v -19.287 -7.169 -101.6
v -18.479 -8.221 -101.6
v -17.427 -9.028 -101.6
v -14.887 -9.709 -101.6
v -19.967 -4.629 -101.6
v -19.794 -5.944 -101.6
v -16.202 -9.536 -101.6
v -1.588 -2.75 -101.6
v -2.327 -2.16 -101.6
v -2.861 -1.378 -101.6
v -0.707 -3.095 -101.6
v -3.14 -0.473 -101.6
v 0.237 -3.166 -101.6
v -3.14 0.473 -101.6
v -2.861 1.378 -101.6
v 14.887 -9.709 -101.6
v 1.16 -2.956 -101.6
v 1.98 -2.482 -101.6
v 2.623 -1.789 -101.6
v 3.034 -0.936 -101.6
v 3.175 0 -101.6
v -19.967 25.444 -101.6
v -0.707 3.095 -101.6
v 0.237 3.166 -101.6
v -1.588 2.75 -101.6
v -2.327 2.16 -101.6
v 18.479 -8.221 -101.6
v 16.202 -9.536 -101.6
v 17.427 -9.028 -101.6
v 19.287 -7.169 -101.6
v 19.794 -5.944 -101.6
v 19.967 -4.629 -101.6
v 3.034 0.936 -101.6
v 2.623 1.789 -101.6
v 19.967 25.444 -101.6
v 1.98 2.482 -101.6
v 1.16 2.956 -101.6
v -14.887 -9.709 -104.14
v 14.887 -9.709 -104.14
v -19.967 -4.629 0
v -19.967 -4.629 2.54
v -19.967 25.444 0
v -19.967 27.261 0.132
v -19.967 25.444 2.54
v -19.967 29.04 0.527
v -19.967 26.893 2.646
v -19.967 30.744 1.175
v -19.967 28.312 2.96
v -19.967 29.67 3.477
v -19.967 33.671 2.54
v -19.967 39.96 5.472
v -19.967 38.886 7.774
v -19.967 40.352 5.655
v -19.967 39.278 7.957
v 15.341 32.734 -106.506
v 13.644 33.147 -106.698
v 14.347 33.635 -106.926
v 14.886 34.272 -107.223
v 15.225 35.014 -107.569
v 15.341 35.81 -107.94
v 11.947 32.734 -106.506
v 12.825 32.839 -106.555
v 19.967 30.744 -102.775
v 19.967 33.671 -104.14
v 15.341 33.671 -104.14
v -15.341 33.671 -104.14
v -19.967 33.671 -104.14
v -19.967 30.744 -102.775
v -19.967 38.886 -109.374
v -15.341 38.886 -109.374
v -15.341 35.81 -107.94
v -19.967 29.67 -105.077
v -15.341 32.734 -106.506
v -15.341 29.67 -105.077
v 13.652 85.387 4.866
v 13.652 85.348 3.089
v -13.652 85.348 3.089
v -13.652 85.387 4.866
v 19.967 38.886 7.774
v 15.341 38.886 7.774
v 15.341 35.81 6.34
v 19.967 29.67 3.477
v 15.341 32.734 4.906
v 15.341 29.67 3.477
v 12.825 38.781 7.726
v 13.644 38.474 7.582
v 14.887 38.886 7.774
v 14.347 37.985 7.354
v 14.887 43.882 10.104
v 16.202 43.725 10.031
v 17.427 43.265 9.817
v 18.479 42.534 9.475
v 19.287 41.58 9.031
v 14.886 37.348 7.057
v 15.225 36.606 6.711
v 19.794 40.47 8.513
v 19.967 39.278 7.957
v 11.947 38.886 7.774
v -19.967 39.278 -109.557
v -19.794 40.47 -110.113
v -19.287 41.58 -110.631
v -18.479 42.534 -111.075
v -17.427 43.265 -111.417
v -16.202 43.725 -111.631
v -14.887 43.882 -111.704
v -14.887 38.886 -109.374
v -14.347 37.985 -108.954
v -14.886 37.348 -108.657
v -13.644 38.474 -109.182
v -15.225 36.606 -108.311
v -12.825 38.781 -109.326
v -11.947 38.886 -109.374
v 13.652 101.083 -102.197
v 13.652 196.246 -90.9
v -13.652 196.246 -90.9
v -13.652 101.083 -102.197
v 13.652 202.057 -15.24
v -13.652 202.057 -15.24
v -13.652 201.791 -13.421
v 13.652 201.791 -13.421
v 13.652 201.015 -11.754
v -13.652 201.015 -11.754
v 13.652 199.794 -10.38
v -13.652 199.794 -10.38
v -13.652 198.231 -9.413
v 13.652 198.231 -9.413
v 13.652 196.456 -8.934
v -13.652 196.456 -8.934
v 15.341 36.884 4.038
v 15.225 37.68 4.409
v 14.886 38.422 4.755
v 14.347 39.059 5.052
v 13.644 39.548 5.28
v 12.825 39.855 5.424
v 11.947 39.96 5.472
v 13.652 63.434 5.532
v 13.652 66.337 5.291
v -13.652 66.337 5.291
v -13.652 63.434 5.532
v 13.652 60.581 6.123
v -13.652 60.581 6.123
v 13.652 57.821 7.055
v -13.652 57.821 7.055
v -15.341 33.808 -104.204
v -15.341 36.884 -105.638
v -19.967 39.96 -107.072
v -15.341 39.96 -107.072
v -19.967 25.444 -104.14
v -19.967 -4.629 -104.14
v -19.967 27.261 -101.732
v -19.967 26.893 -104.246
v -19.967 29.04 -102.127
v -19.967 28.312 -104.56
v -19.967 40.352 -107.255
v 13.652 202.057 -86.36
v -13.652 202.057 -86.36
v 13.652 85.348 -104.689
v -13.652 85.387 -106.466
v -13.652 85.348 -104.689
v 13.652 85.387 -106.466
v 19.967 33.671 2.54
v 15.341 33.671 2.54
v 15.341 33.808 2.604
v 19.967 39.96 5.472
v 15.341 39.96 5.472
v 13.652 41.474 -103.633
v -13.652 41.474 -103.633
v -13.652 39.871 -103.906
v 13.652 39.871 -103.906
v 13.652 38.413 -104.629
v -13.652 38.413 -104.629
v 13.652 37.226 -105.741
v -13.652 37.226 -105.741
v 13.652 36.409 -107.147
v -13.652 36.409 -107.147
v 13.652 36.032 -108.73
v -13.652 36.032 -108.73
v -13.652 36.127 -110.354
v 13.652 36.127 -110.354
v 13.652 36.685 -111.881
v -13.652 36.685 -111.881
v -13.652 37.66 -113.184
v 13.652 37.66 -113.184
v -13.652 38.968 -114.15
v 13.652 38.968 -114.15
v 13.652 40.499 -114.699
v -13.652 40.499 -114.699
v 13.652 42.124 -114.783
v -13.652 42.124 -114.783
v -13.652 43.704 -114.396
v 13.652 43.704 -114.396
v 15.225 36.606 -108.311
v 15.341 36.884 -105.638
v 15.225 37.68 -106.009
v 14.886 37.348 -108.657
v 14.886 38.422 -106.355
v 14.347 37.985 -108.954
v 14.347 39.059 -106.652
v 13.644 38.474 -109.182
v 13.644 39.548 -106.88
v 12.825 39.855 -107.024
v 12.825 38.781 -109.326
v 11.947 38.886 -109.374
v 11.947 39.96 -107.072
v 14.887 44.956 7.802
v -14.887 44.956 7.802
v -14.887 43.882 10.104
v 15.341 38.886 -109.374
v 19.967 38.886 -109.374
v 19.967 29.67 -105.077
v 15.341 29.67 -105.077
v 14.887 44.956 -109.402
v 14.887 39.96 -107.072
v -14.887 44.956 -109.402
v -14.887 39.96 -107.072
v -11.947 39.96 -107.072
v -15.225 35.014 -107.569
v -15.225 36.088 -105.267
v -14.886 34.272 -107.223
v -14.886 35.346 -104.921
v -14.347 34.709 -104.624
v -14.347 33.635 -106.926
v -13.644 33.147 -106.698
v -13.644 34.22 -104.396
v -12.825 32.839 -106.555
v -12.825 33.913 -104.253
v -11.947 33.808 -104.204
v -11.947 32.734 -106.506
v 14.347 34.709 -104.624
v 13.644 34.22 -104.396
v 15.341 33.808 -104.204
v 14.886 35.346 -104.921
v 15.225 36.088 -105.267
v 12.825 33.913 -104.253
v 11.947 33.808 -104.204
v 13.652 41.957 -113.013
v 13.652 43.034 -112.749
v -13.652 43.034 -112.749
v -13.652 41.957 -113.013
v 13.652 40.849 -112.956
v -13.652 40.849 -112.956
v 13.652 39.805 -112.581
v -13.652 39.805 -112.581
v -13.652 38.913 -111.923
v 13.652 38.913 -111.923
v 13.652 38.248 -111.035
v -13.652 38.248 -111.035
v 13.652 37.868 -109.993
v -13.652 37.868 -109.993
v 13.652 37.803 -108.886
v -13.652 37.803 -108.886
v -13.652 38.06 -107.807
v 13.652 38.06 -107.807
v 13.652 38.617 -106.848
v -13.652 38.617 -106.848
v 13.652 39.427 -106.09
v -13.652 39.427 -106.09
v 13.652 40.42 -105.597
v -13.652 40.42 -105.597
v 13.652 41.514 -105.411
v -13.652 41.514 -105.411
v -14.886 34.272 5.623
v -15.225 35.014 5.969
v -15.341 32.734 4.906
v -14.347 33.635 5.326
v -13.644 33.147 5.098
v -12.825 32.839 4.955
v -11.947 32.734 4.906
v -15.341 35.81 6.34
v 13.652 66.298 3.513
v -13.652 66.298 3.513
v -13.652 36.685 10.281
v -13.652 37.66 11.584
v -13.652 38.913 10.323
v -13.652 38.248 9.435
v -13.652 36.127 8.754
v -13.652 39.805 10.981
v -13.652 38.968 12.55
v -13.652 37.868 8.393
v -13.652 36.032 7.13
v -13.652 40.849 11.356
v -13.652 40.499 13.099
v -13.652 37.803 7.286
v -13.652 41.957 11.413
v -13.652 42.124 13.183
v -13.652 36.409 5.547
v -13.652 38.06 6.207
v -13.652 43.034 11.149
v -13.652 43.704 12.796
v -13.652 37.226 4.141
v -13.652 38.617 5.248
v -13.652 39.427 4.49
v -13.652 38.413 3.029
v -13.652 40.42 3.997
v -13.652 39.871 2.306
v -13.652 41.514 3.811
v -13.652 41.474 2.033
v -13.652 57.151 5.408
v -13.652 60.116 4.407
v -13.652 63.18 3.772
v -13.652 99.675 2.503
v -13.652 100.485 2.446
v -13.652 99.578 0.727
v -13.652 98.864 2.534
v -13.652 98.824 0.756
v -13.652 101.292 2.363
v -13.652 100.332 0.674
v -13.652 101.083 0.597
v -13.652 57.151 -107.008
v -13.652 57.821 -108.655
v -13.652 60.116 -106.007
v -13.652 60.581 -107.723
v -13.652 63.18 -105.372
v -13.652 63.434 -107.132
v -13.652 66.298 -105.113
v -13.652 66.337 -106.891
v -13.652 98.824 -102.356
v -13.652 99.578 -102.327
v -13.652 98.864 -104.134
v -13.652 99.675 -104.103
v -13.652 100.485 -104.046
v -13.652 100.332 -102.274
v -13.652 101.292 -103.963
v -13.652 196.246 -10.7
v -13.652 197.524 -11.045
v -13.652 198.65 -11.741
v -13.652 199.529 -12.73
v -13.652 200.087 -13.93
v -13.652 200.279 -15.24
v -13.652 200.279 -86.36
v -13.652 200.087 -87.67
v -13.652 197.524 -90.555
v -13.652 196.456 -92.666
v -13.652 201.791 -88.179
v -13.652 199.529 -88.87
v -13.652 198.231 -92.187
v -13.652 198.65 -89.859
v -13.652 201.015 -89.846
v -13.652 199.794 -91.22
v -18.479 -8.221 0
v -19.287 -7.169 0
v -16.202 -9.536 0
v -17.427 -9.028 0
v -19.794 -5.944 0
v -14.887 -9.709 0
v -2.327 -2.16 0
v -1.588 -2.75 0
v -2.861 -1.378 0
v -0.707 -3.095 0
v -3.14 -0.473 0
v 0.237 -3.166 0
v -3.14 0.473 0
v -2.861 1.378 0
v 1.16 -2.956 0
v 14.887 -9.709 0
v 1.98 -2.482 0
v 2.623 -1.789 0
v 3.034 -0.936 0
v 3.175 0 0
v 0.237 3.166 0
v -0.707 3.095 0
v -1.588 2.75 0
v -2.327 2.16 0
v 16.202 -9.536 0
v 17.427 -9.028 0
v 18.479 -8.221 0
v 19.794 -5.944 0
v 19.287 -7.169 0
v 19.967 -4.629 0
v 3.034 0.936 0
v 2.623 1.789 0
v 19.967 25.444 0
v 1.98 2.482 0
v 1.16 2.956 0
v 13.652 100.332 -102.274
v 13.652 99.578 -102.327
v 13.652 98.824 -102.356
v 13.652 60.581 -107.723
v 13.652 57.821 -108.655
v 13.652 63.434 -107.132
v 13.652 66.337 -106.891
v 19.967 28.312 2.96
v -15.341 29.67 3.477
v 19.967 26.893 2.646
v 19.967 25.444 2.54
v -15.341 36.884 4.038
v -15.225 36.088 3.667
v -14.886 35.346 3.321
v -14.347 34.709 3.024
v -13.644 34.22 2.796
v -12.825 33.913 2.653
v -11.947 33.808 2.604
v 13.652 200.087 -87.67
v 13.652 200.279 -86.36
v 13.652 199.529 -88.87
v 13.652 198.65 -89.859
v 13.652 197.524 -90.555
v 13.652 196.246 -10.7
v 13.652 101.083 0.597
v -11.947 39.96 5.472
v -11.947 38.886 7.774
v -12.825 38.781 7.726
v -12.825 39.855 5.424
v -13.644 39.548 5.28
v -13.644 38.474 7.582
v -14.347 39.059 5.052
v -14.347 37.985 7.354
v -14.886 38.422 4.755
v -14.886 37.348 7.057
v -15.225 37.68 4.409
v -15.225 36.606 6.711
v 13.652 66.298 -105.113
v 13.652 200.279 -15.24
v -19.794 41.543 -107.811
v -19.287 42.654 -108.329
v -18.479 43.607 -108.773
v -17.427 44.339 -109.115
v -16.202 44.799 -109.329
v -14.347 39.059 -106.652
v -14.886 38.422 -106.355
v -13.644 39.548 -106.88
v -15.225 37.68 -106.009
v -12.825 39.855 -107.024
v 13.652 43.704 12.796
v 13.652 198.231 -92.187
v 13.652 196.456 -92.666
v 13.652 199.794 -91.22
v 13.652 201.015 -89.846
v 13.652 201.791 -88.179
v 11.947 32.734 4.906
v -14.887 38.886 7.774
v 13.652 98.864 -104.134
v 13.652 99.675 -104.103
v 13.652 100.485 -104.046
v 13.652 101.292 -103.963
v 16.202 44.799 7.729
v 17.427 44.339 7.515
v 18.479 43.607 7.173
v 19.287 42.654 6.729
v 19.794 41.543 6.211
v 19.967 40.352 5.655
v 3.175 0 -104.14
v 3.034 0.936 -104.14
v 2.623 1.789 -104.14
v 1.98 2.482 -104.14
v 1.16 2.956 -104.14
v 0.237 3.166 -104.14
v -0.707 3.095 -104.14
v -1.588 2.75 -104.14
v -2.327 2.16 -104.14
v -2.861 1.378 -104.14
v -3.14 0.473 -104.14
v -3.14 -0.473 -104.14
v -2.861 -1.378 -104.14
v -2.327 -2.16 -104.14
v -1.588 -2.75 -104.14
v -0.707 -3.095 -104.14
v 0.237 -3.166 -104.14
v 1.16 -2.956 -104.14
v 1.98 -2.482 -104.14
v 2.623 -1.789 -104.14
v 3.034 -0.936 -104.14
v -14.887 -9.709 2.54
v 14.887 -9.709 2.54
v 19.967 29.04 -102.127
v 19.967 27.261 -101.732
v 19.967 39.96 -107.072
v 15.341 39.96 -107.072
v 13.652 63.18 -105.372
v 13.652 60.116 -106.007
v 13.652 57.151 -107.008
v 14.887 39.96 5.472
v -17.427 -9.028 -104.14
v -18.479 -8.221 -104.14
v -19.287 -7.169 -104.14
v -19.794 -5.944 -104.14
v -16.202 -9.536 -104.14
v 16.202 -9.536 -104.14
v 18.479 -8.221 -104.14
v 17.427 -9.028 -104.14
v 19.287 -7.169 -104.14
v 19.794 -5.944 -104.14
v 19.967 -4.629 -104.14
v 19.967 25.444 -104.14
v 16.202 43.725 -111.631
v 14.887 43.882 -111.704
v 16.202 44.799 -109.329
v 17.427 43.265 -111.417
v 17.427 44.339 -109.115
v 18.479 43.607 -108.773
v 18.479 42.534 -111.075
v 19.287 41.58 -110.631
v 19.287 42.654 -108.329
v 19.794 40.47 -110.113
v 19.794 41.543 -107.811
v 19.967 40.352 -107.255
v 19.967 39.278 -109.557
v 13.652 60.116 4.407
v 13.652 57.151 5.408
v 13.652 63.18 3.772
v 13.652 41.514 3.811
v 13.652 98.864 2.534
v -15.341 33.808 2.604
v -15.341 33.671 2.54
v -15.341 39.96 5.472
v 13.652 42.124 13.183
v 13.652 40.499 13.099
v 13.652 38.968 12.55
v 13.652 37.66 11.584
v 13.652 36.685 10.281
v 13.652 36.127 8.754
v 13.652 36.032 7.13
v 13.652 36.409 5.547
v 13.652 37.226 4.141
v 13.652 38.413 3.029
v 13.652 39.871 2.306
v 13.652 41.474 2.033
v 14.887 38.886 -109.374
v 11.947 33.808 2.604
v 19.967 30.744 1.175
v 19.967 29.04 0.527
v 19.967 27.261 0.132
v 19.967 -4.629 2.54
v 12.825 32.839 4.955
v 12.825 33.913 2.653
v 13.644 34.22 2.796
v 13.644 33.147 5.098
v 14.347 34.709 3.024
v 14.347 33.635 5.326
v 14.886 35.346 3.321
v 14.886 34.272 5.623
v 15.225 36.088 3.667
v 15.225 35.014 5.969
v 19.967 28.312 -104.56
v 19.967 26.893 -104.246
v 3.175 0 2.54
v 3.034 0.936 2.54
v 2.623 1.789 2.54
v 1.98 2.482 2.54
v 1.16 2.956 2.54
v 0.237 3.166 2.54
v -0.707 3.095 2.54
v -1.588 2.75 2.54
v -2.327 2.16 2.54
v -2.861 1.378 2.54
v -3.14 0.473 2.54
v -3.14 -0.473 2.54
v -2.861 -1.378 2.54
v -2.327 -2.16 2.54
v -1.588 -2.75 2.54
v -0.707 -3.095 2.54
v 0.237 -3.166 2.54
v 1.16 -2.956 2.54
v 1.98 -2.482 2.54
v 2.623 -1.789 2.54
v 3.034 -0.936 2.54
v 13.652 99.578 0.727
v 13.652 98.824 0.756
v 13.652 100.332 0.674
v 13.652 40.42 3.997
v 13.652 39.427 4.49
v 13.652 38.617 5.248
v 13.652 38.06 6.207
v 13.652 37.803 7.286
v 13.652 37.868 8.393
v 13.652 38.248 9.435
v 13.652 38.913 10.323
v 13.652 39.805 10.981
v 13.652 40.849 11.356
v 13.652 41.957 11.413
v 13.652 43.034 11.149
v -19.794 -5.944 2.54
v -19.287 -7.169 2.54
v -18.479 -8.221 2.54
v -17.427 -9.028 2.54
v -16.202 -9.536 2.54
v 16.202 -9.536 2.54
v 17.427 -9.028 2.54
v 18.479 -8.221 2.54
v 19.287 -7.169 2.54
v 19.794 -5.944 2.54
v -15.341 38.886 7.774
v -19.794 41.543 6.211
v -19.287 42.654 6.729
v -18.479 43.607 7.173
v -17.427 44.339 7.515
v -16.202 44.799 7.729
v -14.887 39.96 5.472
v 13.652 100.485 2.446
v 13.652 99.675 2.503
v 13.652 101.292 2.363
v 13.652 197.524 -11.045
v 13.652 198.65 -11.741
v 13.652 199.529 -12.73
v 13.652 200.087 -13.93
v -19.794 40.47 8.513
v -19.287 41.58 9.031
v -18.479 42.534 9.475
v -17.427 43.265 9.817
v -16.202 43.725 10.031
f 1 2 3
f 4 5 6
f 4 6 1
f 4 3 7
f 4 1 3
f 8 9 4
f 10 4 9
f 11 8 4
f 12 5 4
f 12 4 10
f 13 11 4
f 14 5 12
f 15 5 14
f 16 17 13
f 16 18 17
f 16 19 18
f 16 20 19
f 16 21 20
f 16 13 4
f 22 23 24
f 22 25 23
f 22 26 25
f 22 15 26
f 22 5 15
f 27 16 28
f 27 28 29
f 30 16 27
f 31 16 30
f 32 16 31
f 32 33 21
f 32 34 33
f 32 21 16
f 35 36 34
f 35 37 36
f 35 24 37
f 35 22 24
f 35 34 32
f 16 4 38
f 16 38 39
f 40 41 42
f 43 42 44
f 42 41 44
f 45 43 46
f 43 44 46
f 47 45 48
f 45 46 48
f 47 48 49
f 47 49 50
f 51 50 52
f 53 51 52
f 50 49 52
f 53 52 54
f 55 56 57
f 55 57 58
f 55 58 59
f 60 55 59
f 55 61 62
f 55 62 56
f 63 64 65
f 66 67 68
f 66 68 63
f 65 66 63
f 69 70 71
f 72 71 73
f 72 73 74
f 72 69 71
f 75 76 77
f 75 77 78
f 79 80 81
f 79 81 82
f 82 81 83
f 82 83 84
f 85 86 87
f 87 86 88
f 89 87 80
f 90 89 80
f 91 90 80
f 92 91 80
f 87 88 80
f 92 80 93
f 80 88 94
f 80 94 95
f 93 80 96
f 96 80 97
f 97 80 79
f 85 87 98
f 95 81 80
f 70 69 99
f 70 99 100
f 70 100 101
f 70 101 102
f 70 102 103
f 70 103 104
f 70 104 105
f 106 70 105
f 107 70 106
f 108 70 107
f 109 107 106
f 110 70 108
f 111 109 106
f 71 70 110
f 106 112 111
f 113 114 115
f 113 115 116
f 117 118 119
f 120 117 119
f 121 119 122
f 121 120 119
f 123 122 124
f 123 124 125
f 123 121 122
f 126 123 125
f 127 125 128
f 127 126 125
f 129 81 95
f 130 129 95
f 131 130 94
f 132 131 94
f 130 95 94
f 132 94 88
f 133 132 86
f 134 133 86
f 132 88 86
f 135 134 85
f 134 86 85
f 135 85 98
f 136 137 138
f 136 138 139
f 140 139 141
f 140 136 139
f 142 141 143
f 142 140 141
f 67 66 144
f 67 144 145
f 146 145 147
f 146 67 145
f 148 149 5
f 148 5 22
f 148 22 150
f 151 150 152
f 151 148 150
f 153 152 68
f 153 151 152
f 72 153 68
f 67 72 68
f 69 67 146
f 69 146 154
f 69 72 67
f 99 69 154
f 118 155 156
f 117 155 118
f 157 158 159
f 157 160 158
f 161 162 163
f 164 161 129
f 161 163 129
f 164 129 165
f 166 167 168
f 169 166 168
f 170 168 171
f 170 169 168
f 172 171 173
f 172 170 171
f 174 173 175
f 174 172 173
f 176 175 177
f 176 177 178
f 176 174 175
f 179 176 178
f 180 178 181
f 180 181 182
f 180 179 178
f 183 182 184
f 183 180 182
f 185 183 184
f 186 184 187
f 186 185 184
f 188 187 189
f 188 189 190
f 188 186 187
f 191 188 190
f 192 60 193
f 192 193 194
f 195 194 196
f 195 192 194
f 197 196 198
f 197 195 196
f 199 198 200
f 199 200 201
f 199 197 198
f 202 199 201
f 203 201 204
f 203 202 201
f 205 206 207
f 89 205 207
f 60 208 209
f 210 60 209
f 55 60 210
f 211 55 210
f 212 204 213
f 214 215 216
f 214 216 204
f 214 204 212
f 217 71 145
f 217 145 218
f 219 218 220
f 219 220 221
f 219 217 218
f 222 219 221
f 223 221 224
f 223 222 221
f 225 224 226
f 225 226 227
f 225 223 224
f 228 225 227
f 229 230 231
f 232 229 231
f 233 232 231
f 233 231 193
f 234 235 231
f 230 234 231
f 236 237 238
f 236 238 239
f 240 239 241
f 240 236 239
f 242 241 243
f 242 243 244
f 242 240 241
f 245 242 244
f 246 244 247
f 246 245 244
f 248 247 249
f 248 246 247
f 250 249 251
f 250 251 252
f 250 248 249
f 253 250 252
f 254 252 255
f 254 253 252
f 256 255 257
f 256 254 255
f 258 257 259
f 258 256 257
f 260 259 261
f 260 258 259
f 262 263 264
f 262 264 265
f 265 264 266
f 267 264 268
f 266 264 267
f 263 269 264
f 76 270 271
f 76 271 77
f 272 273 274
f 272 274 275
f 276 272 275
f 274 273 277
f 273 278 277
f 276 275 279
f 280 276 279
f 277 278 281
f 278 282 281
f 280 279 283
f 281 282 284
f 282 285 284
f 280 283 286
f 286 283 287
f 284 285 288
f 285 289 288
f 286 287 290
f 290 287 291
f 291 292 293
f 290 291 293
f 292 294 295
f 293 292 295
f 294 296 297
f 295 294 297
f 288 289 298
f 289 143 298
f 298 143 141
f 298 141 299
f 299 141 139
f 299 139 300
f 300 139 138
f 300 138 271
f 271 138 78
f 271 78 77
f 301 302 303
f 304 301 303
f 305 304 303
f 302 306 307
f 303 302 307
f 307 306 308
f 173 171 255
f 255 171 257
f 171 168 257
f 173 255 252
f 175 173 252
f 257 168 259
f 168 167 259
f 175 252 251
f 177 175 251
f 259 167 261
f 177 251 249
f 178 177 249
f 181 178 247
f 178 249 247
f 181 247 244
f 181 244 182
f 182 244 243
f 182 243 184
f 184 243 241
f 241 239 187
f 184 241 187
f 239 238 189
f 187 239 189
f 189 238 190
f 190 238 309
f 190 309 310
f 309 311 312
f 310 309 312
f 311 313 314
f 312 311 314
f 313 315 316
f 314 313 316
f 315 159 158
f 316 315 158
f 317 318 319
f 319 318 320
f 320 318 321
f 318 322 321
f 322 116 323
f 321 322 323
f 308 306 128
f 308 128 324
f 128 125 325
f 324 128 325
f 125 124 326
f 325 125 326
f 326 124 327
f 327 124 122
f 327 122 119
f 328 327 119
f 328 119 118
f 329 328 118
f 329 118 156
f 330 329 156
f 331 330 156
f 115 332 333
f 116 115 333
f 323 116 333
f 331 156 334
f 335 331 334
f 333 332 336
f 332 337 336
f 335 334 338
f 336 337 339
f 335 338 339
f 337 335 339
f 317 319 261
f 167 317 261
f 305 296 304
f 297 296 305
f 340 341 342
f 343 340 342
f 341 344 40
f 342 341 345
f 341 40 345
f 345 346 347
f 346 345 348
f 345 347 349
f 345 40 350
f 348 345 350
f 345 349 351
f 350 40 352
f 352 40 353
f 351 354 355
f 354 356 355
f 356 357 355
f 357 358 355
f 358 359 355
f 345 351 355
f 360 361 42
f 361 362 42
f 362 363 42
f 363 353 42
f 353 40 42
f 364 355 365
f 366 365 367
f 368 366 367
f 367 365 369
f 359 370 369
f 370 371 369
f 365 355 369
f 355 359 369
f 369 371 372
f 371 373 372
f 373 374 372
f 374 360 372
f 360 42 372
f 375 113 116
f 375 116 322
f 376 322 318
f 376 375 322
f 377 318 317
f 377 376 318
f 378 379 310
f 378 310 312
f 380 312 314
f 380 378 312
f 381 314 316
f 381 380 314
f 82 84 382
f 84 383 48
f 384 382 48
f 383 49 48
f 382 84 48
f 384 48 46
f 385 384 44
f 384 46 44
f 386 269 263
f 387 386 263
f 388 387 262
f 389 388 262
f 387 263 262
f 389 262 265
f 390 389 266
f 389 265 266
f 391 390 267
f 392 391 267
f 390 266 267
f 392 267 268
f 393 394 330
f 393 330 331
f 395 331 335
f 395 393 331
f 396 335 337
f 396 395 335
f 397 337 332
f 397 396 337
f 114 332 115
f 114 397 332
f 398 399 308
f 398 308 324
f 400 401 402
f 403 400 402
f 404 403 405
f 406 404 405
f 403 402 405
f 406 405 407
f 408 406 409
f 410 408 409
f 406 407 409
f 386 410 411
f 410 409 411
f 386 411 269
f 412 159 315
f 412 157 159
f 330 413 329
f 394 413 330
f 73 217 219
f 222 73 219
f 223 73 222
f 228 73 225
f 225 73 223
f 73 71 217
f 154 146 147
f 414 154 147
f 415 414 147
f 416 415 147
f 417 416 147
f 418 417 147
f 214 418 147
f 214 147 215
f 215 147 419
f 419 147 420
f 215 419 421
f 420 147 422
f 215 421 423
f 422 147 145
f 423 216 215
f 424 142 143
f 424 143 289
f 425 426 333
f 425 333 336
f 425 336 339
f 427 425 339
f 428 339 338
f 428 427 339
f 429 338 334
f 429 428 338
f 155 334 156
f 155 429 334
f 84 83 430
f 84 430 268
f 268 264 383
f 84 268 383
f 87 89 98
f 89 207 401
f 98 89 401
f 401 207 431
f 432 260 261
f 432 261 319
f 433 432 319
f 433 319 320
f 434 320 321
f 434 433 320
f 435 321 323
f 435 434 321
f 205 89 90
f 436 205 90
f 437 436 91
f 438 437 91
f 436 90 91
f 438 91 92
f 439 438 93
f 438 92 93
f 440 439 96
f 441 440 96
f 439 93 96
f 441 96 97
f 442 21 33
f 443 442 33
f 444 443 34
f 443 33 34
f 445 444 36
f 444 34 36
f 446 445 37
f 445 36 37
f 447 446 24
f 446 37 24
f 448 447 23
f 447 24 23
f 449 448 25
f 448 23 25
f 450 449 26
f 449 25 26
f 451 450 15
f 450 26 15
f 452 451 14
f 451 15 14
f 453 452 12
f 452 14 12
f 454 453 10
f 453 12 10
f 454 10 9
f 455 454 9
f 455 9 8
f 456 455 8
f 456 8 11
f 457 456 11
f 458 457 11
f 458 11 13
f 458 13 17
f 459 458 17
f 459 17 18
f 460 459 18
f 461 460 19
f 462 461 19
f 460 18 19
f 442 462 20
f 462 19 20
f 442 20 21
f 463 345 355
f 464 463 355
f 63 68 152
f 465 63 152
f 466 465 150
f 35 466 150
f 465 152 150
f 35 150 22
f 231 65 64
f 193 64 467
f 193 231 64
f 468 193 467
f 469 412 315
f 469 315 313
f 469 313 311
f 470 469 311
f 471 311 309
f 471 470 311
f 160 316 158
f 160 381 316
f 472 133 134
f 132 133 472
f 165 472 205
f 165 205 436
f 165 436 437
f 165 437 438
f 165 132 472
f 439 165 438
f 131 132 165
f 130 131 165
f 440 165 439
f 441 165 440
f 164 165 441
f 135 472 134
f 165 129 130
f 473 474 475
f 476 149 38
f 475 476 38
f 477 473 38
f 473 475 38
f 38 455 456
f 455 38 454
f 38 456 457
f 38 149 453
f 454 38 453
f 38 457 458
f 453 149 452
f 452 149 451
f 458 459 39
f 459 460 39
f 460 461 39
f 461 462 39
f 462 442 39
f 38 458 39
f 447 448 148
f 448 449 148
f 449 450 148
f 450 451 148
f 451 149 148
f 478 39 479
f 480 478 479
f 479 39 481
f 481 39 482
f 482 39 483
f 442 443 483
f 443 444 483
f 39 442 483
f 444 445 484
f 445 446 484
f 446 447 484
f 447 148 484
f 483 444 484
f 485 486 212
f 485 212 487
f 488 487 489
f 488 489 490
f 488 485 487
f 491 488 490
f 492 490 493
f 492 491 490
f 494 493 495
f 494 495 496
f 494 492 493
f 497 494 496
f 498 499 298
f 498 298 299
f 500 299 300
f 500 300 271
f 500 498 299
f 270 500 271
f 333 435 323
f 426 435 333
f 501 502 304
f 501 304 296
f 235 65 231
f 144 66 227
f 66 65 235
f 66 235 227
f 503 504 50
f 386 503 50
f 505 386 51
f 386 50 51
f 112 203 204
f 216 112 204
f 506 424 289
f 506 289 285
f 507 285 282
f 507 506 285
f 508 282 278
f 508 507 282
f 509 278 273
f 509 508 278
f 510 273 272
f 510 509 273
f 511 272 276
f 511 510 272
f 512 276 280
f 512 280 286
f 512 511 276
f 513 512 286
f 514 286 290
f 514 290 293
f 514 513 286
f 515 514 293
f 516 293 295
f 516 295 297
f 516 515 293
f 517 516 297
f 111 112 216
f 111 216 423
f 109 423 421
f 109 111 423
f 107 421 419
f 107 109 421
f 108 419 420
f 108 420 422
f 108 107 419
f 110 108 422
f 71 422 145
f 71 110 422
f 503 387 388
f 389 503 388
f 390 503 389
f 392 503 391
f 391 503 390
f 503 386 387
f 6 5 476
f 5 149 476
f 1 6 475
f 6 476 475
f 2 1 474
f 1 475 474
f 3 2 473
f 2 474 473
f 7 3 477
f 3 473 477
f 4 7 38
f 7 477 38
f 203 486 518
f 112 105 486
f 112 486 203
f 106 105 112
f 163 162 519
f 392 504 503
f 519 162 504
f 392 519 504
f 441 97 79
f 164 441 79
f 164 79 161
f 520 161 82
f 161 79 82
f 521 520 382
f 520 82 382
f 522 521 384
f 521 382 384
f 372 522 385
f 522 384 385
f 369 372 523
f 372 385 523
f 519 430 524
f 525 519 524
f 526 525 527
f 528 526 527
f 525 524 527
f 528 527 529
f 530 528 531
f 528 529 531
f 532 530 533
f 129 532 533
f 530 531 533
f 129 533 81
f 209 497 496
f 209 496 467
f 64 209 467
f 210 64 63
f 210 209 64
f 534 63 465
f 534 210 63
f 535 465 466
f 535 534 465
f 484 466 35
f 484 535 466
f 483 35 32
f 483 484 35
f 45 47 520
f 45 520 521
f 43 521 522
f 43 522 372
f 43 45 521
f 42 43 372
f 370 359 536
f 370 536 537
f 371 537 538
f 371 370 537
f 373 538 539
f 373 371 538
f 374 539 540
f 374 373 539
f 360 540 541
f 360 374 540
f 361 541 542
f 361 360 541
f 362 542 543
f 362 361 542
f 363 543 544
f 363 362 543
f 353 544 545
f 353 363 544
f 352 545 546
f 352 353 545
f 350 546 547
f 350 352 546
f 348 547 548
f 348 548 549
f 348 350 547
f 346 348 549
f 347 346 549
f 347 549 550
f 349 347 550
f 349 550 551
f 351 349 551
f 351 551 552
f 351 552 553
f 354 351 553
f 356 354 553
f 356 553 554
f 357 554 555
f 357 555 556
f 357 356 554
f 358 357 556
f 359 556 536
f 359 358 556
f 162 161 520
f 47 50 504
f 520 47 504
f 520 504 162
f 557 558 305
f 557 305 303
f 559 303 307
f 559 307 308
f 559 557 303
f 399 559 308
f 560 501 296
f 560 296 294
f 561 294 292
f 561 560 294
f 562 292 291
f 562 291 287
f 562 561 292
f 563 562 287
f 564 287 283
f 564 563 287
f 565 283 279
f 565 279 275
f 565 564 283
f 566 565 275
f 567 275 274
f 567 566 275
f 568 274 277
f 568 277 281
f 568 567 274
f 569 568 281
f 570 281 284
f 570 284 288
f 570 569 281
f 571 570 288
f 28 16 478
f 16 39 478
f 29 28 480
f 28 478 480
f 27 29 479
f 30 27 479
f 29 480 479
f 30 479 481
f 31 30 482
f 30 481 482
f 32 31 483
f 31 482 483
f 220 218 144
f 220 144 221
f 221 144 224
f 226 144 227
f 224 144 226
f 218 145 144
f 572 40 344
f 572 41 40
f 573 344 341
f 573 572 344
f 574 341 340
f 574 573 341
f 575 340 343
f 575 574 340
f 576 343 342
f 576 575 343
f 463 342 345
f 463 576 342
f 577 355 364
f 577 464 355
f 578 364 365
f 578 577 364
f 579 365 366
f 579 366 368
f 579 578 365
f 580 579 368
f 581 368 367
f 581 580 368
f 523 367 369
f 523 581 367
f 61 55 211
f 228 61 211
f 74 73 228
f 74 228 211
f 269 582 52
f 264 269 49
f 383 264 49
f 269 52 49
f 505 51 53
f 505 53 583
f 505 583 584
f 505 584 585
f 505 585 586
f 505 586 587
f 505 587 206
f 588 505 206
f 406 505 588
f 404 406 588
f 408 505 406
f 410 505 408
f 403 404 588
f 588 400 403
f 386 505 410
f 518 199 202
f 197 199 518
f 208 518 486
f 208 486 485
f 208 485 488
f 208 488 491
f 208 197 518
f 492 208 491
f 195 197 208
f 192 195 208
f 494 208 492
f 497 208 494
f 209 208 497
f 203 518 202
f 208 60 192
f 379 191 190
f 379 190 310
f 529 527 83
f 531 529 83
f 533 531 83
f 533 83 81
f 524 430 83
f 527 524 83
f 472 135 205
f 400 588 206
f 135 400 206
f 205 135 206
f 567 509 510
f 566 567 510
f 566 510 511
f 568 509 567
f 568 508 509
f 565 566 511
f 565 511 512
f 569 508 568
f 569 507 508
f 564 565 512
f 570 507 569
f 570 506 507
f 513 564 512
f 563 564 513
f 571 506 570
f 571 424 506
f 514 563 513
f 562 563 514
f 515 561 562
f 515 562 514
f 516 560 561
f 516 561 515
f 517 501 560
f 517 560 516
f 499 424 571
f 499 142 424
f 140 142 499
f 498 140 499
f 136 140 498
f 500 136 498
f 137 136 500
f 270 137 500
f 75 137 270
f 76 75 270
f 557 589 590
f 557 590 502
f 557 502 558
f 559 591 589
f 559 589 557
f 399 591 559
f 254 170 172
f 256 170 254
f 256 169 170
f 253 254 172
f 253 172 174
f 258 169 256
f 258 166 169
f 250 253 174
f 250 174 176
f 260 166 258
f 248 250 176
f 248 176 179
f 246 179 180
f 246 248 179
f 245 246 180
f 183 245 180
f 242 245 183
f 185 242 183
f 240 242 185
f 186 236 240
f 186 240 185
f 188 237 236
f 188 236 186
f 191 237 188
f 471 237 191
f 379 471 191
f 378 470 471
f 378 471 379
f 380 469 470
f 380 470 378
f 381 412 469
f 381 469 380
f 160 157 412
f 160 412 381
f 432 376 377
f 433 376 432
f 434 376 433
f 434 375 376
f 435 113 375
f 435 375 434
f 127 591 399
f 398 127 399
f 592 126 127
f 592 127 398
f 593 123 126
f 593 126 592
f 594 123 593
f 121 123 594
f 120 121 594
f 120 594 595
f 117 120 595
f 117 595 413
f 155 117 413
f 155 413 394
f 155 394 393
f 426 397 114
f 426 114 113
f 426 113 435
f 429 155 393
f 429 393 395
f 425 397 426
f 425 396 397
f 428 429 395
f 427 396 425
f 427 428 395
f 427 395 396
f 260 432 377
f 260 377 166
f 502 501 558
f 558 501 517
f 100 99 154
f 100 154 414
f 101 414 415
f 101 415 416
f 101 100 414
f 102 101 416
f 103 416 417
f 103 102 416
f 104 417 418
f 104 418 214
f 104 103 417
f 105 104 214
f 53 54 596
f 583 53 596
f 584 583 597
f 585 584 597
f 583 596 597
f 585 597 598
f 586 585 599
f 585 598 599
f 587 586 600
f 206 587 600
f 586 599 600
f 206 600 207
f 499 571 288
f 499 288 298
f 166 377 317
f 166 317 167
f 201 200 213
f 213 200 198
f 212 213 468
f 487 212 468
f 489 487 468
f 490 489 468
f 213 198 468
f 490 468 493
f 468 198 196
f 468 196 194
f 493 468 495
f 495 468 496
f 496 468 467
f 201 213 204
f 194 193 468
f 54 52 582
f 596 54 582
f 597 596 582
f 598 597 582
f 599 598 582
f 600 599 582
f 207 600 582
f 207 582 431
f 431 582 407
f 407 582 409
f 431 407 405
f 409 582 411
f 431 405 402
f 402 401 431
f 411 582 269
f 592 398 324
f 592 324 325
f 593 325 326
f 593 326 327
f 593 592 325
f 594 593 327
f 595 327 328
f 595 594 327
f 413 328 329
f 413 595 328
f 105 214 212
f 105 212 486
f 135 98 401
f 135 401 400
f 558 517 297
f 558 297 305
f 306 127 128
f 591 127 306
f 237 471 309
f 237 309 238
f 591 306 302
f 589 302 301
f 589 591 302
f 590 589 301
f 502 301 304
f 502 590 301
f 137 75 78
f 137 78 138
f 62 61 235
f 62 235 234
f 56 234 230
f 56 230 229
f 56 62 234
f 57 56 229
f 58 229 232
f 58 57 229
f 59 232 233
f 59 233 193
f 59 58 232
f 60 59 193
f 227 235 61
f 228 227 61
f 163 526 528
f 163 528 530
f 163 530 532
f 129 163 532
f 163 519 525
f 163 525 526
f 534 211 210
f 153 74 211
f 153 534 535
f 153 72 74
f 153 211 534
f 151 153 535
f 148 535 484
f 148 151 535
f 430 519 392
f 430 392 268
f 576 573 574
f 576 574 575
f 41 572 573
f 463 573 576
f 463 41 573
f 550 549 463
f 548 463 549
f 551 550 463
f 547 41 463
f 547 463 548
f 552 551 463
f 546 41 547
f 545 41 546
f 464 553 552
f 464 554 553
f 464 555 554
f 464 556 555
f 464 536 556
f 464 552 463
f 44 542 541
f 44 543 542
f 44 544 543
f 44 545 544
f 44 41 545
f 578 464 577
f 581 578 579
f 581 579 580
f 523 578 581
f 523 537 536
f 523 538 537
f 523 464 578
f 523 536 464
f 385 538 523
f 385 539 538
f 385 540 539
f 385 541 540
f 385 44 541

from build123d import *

# Parameters (mm, degrees)
SKETCH1_W              = 39.934289188
SKETCH1_H              = 55.751858455
SKETCH1_R              = 3.175
BOSS_EXTRUDE1_DEPTH    = 2.54
FILLET1_R              = 5.08
SKETCHED_START         = 13.211024663
SKETCHED_BEND1_DEPTH   = 6.788975337
SKETCHED_START_2       = -19.967144594
SKETCHED_BEND1_2_DEPTH = 39.934289188
SKETCHED_START_3       = -14.887144594
SKETCHED_BEND1_3_DEPTH = 29.774289188
SKETCHED_START_4       = 15.340595558
SKETCHED_BEND1_4_DEPTH = 4.626549036
SKETCHED_BEND1_5_DEPTH = 4.626548936
SKETCHED_START_5       = -16.083135627
SKETCHED_BEND1_6_DEPTH = 31.94743135
SKETCHED_START_6       = 9.387948772
SKETCHED_BEND1_7_DEPTH = 2.54
EXTRUDE_THIN3_DEPTH    = 13.6525


with BuildPart() as part:
    # Sketch1 → Boss-Extrude1 (new body)
    with BuildSketch(Plane.XY):
        with Locations((0, 18.166848245)):
            Rectangle(SKETCH1_W, SKETCH1_H)
        Circle(SKETCH1_R, mode=Mode.SUBTRACT)
        with BuildLine():
            Line((-11.946779197, 40.530159664), (11.946779197, 40.530159664))
            ThreePointArc((11.946779197, 40.530159664), (15.340595558, 37.136343303), (11.946779197, 33.742526942))
            Line((11.946779197, 33.742526942), (-11.946779197, 33.742526942))
            ThreePointArc((-11.946779197, 33.742526942), (-15.340595558, 37.136343303), (-11.946779197, 40.530159664))
        make_face(mode=Mode.SUBTRACT)
    extrude(amount=BOSS_EXTRUDE1_DEPTH)

    # Fillet1
    fillet1_edges = [part.edges().sort_by_distance(p)[0] for p in [
        (-19.967144594, 46.042777472, 1.27),
        (19.967144594, 46.042777472, 1.27),
        (19.967144594, -9.709080983, 1.27),
        (-19.967144594, -9.709080983, 1.27),
    ]]
    fillet(fillet1_edges, radius=FILLET1_R)

    # Sketched Bend1: read off the stored shape, not the designer's step
    # Sketched Bend1 outline → Sketched Bend1 (cut)
    with BuildSketch(Plane(origin=(0, 0, 0), x_dir=(1, 0, 0), z_dir=(0, 0.4226182617407011, -0.9063077870366493)).offset(SKETCHED_START)):
        with BuildLine():
            Line((-11.946779197, -38.528434057), (11.946779197, -38.528434057))
            ThreePointArc((11.946779197, -38.528434057), (15.340595558, -35.134617696), (11.946779197, -31.740801335))
            Line((11.946779197, -31.740801335), (-11.946779197, -31.740801335))
            ThreePointArc((-11.946779197, -31.740801335), (-15.340595558, -35.134617696), (-11.946779197, -38.528434057))
        make_face()
    extrude(amount=SKETCHED_BEND1_DEPTH, mode=Mode.SUBTRACT)

    # Sketched Bend1 2 outline → Sketched Bend1 2 (cut)
    with BuildSketch(Plane.YZ.offset(SKETCHED_START_2)):
        with BuildLine():
            Line((33.670978847, 2.54), (30.743513202, 1.174900351))
            ThreePointArc((30.743513202, 1.174900351), (28.158032959, 0.297248071), (25.4438802, 0))
            Line((25.4438802, 0), (46.042777472, 0))
            Line((46.042777472, 0), (46.042777472, 2.54))
            Line((46.042777472, 2.54), (33.670978847, 2.54))
        make_face()
    extrude(amount=SKETCHED_BEND1_2_DEPTH, mode=Mode.SUBTRACT)

    # Sketched Bend1 3 outline → Sketched Bend1 3 (add)
    with BuildSketch(Plane.YZ.offset(SKETCHED_START_3)):
        with BuildLine():
            Line((32.734454008, 4.90587121), (29.670062817, 3.47692213))
            ThreePointArc((29.670062817, 3.47692213), (27.608276339, 2.777039929), (25.4438802, 2.54))
            Line((25.4438802, 2.54), (33.670978847, 2.54))
            Line((33.670978847, 2.54), (33.807904393, 2.603849431))
            Line((33.807904393, 2.603849431), (32.734454008, 4.90587121))
        make_face()
        Polygon((43.882266846, 10.104181707), (38.886138399, 7.774448751), (39.959588784, 5.472426973), (44.95571723, 7.802159928), align=None)
    extrude(amount=SKETCHED_BEND1_3_DEPTH)

    # Sketched Bend1 4 outline → Sketched Bend1 4 (add)
    with BuildSketch(Plane.YZ.offset(SKETCHED_START_4)):
        with BuildLine():
            ThreePointArc((29.670062817, 3.47692213), (27.608276339, 2.777039929), (25.4438802, 2.54))
            Line((25.4438802, 2.54), (33.670978847, 2.54))
            Line((33.670978847, 2.54), (39.959588784, 5.472426973))
            Line((39.959588784, 5.472426973), (38.886138399, 7.774448752))
            Line((38.886138399, 7.774448752), (29.670062817, 3.47692213))
        make_face()
    extrude(amount=SKETCHED_BEND1_4_DEPTH)

    # Sketched Bend1 5 outline → Sketched Bend1 5 (add)
    with BuildSketch(Plane.YZ.offset(SKETCHED_START_2)):
        with BuildLine():
            ThreePointArc((29.670062817, 3.47692213), (27.608276339, 2.777039929), (25.4438802, 2.54))
            Line((25.4438802, 2.54), (33.670978847, 2.54))
            Line((33.670978847, 2.54), (39.959588784, 5.472426973))
            Line((39.959588784, 5.472426973), (38.886138399, 7.774448752))
            Line((38.886138399, 7.774448752), (29.670062817, 3.47692213))
        make_face()
    extrude(amount=SKETCHED_BEND1_5_DEPTH)

    # Sketched Bend1 6 outline → Sketched Bend1 6 (add)
    with BuildSketch(Plane.YZ.offset(SKETCHED_START_5)):
        with BuildLine():
            Line((32.734454008, 4.90587121), (29.670062817, 3.47692213))
            ThreePointArc((29.670062817, 3.47692213), (27.608276339, 2.777039929), (25.4438802, 2.54))
            Line((25.4438802, 2.54), (33.670978847, 2.54))
            Line((33.670978847, 2.54), (33.807904393, 2.603849431))
            Line((33.807904393, 2.603849431), (32.734454008, 4.90587121))
        make_face()
    extrude(amount=SKETCHED_BEND1_6_DEPTH)

    # Sketched Bend1 7 outline → Sketched Bend1 7 (add)
    with BuildSketch(Plane(origin=(0, 0, 0), x_dir=(1, 0, 0), z_dir=(0, 0.4226182617407011, -0.9063077870366493)).offset(SKETCHED_START_6)):
        with BuildLine():
            ThreePointArc((15.340595558, -35.134617696), (14.34656976, -37.534408259), (11.946779197, -38.528434057))
            Line((11.946779197, -38.528434057), (14.887144594, -38.528434056))
            Line((14.887144594, -38.528434056), (14.887144594, -44.041051864))
            ThreePointArc((14.887144594, -44.041051864), (18.479247043, -42.553154312), (19.967144594, -38.961051864))
            Line((19.967144594, -38.961051864), (19.967144594, -38.528434057))
            Line((19.967144594, -38.528434057), (15.340595558, -38.528434057))
            Line((15.340595558, -38.528434057), (15.340595558, -35.134617696))
        make_face()
        with BuildLine():
            ThreePointArc((11.946779197, -31.740801335), (14.34656976, -32.734827133), (15.340595558, -35.134617696))
            Line((15.340595558, -35.134617696), (15.340595558, -31.740801335))
            Line((15.340595558, -31.740801335), (11.946779197, -31.740801335))
        make_face()
        with BuildLine():
            Line((-14.887144594, -38.528434056), (-11.946779197, -38.528434057))
            ThreePointArc((-11.946779197, -38.528434057), (-14.34656976, -37.534408259), (-15.340595558, -35.134617696))
            Line((-15.340595558, -35.134617696), (-15.340595658, -38.528434057))
            Line((-15.340595658, -38.528434057), (-19.967144594, -38.528434057))
            Line((-19.967144594, -38.528434057), (-19.967144594, -38.961051864))
            ThreePointArc((-19.967144594, -38.961051864), (-18.479247043, -42.553154312), (-14.887144594, -44.041051864))
            Line((-14.887144594, -44.041051864), (-14.887144594, -38.528434056))
        make_face()
        with BuildLine():
            Line((-15.340595658, -31.740801335), (-15.340595558, -35.134617696))
            ThreePointArc((-15.340595558, -35.134617696), (-14.34656976, -32.734827133), (-11.946779197, -31.740801335))
            Line((-11.946779197, -31.740801335), (-15.340595658, -31.740801335))
        make_face()
    extrude(amount=SKETCHED_BEND1_7_DEPTH)


with BuildPart() as body_2:
    # Mirror1: mirrored copy
    add(part.part.mirror(Plane(origin=(0, 0, -50.8), x_dir=(1, 0, 0), z_dir=(0, 0, -1))))


with BuildPart() as body_3:
    # Sketch10 → Extrude-Thin3 (new, symmetric)
    with BuildSketch(Plane(origin=(0, 0, 0), x_dir=(0, 0, -1), z_dir=(1, 0, 0))):
        with BuildLine():
            Line((104.688774774, 85.347872367), (105.113038889, 66.297872367))
            ThreePointArc((105.113038889, 66.297872367), (105.643116213, 61.638035226), (107.007856334, 57.151104365))
            Line((107.007856334, 57.151104365), (112.749284639, 43.033965808))
            ThreePointArc((112.749284639, 43.033965808), (109.992859285, 37.867819469), (105.410944531, 41.513776945))
            Line((105.410944531, 41.513776945), (104.133703128, 98.863545249))
            ThreePointArc((104.133703128, 98.863545249), (104.077414719, 100.079969515), (103.962889985, 101.292298045))
            Line((103.962889985, 101.292298045), (92.665722496, 196.455574511))
            ThreePointArc((92.665722496, 196.455574511), (90.57717037, 200.454417622), (86.36, 202.057))
            Line((86.36, 202.057), (15.24, 202.057))
            ThreePointArc((15.24, 202.057), (11.02282963, 200.454417622), (8.934277504, 196.455574511))
            Line((8.934277504, 196.455574511), (-2.362889985, 101.292298045))
            ThreePointArc((-2.362889985, 101.292298045), (-2.477414719, 100.079969515), (-2.533703128, 98.863545249))
            Line((-2.533703128, 98.863545249), (-3.810944531, 41.513776945))
            ThreePointArc((-3.810944531, 41.513776945), (-8.392859285, 37.867819469), (-11.149284639, 43.033965808))
            Line((-11.149284639, 43.033965808), (-5.407856334, 57.151104365))
            ThreePointArc((-5.407856334, 57.151104365), (-4.043116213, 61.638035226), (-3.513038889, 66.297872367))
            Line((-3.513038889, 66.297872367), (-3.088774774, 85.347872367))
            Line((-3.088774774, 85.347872367), (-4.866333993, 85.387460534))
            Line((-4.866333993, 85.387460534), (-5.290598108, 66.337460534))
            ThreePointArc((-5.290598108, 66.337460534), (-5.784151202, 61.998702892), (-7.054855833, 57.820937667))
            Line((-7.054855833, 57.820937667), (-12.796284137, 43.703799111))
            ThreePointArc((-12.796284137, 43.703799111), (-8.753526951, 36.12678448), (-2.033385312, 41.474188777))
            Line((-2.033385312, 41.474188777), (-0.756143909, 98.823957082))
            ThreePointArc((-0.756143909, 98.823957082), (-0.703795689, 99.955231649), (-0.597287686, 101.082697182))
            Line((-0.597287686, 101.082697182), (10.699879803, 196.245973648))
            ThreePointArc((10.699879803, 196.245973648), (12.203637334, 199.125140688), (15.24, 200.279))
            Line((15.24, 200.279), (86.36, 200.279))
            ThreePointArc((86.36, 200.279), (89.396362666, 199.125140688), (90.900120197, 196.245973648))
            Line((90.900120197, 196.245973648), (102.197287686, 101.082697182))
            ThreePointArc((102.197287686, 101.082697182), (102.303795689, 99.955231649), (102.356143909, 98.823957082))
            Line((102.356143909, 98.823957082), (103.633385312, 41.474188777))
            ThreePointArc((103.633385312, 41.474188777), (110.353526951, 36.12678448), (114.396284137, 43.703799111))
            Line((114.396284137, 43.703799111), (108.654855833, 57.820937667))
            ThreePointArc((108.654855833, 57.820937667), (107.384151202, 61.998702892), (106.890598108, 66.337460534))
            Line((106.890598108, 66.337460534), (106.466333993, 85.387460534))
            Line((106.466333993, 85.387460534), (104.688774774, 85.347872367))
        make_face()
    extrude(amount=EXTRUDE_THIN3_DEPTH, both=True)


solid = Compound([part.part, body_2.part, body_3.part])
